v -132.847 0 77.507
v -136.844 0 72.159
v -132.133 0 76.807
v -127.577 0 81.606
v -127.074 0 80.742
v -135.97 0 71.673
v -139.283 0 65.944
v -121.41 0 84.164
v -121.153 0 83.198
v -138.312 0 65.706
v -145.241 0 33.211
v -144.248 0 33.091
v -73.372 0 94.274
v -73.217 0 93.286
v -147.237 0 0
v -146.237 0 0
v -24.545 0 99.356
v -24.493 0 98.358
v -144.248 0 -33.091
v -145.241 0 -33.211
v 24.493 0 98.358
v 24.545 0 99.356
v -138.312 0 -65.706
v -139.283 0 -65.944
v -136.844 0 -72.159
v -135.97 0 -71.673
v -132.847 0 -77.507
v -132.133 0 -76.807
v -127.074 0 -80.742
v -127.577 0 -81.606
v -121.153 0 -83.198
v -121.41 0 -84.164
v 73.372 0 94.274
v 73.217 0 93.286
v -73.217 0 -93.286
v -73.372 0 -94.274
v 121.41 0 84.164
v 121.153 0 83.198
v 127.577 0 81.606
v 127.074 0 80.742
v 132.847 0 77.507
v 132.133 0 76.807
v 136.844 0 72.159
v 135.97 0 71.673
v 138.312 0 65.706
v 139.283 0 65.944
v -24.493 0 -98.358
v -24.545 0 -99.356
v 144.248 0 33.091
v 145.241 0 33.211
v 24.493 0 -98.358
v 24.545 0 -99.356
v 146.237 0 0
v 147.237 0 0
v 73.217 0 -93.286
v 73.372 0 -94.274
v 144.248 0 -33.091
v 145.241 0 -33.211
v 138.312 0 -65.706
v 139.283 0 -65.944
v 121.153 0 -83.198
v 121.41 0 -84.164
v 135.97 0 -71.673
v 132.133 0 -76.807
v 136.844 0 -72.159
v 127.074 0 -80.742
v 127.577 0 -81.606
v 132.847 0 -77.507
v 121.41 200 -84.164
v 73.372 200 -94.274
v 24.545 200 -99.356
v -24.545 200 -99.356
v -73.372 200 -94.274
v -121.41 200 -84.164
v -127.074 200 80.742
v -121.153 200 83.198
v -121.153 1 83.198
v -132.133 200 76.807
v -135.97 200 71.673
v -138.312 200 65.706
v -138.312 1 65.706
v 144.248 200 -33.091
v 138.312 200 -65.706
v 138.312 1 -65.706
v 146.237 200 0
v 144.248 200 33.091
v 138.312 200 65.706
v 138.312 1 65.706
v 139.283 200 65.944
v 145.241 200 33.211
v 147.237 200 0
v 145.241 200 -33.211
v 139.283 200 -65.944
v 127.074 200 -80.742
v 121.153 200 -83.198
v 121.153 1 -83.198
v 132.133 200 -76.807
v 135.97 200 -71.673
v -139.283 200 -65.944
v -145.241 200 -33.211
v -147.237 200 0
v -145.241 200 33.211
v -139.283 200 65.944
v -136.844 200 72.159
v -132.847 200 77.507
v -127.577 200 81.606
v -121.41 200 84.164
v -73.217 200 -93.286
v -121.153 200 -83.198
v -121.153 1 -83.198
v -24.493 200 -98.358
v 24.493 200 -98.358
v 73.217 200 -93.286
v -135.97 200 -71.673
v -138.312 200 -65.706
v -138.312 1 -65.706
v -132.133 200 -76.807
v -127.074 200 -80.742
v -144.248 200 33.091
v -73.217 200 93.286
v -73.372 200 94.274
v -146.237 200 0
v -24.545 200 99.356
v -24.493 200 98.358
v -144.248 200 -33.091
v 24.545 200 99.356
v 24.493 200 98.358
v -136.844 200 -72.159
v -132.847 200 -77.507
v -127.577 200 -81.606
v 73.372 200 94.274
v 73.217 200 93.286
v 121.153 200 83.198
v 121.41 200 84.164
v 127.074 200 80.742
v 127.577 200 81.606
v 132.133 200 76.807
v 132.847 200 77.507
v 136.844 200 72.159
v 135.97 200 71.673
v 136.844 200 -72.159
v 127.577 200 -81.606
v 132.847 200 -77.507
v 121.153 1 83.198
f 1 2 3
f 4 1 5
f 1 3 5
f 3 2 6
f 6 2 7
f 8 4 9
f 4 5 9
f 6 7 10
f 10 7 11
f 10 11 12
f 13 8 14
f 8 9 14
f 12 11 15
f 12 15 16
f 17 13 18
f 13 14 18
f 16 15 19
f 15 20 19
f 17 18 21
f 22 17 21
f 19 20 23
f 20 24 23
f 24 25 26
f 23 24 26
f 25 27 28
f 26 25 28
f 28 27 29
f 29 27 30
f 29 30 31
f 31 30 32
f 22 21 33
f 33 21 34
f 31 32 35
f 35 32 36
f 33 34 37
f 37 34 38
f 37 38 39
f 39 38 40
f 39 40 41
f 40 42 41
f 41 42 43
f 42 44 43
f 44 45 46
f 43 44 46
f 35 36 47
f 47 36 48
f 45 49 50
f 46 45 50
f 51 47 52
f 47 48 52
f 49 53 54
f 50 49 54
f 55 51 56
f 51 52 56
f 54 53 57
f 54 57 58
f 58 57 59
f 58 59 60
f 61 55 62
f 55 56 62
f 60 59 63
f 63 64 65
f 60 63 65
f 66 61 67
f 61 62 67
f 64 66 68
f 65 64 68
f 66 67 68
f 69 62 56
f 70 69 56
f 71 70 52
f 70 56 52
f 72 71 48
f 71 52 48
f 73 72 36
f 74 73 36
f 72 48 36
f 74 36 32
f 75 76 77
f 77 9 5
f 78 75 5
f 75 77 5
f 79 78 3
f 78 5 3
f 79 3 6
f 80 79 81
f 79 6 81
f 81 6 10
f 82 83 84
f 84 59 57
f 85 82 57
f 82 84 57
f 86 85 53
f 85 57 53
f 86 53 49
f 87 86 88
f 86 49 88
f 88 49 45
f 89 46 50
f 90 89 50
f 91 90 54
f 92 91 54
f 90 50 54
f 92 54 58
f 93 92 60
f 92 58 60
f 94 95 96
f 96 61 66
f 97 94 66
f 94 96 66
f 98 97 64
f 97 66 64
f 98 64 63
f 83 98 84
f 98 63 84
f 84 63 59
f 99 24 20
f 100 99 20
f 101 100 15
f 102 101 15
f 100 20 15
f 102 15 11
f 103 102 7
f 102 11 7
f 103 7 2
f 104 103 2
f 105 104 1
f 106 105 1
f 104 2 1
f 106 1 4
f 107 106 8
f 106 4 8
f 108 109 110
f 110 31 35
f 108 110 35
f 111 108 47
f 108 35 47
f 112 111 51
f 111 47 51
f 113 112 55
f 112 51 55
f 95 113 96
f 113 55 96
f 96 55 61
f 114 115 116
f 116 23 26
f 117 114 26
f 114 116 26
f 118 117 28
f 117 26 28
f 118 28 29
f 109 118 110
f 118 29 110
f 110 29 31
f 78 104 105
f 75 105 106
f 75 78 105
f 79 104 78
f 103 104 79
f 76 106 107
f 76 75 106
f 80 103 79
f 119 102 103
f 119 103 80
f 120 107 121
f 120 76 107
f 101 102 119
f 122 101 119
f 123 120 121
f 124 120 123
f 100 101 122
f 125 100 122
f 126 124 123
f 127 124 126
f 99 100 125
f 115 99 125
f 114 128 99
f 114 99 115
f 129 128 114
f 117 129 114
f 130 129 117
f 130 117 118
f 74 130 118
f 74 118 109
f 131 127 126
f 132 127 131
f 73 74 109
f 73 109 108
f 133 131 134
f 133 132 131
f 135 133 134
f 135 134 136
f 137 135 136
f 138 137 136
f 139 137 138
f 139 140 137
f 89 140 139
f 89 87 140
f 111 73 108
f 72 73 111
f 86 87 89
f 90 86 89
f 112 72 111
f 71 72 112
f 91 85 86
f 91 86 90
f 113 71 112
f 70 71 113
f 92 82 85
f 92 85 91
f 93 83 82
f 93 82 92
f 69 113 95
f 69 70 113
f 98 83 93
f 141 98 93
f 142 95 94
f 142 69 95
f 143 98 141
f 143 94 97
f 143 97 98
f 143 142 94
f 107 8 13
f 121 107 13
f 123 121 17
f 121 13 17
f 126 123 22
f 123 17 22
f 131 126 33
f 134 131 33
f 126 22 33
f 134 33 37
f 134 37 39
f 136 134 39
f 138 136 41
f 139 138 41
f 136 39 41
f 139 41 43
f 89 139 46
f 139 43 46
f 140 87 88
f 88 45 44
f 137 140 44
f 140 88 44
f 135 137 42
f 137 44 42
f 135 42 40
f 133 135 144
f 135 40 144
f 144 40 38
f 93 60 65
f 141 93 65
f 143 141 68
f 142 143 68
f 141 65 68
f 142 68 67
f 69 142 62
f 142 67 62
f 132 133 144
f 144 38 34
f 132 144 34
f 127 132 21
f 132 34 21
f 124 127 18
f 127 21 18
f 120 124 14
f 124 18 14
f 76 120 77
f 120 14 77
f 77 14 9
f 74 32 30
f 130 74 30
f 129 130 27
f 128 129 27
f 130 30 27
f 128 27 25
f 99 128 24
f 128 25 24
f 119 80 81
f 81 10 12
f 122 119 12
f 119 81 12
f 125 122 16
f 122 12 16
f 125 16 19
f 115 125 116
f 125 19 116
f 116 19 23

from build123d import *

# Parameters (mm, degrees)
BOSS_EXTRUDE1_DEPTH = 200
SHELL3_T            = -1
CUT_EXTRUDE1_DEPTH  = 200


with BuildPart() as part:
    # Sketch1 → Boss-Extrude1 (new body)
    with BuildSketch(Plane(origin=(0, 0, 0), x_dir=(1, 0, 0), z_dir=(0, 1, 0))):
        with BuildLine():
            ThreePointArc((-121.409753109, 84.164334567), (-132.846711046, 77.506995883), (-139.283044385, 65.944220336))
            ThreePointArc((-139.283044385, 65.944220336), (-147.236834181, 0), (-139.283044385, -65.944220336))
            ThreePointArc((-139.283044385, -65.944220336), (-132.846711046, -77.506995883), (-121.409753109, -84.164334567))
            ThreePointArc((-121.409753109, -84.164334567), (0, -99.99301504), (121.409753109, -84.164334567))
            ThreePointArc((121.409753109, -84.164334567), (132.846711046, -77.506995883), (139.283044385, -65.944220336))
            ThreePointArc((139.283044385, -65.944220336), (147.236834181, 0), (139.283044385, 65.944220336))
            ThreePointArc((139.283044385, 65.944220336), (132.846711046, 77.506995883), (121.409753109, 84.164334567))
            ThreePointArc((121.409753109, 84.164334567), (0, 99.99301504), (-121.409753109, 84.164334567))
        make_face()
    extrude(amount=BOSS_EXTRUDE1_DEPTH)

    # Shell3
    shell3_openings = [part.faces().sort_by_distance(p)[0] for p in [
        (0, 200, 0),
    ]]
    offset(amount=SHELL3_T, openings=shell3_openings, kind=Kind.INTERSECTION)

    # Sketch3 → Cut-Extrude1 (cut)
    with BuildSketch(Plane.XZ):
        with BuildLine():
            ThreePointArc((-121.153362985, -83.197761185), (0, -98.99301504), (121.153362985, -83.197761185))
            ThreePointArc((121.153362985, -83.197761185), (132.132842604, -76.806716048), (138.311722609, -65.706451522))
            ThreePointArc((138.311722609, -65.706451522), (146.236834181, 0), (138.311722609, 65.706451522))
            ThreePointArc((138.311722609, 65.706451522), (132.132842604, 76.806716048), (121.153362985, 83.197761185))
            ThreePointArc((121.153362985, 83.197761185), (0, 98.99301504), (-121.153362985, 83.197761185))
            ThreePointArc((-121.153362985, 83.197761185), (-132.132842604, 76.806716048), (-138.311722609, 65.706451522))
            ThreePointArc((-138.311722609, 65.706451522), (-146.236834181, 0), (-138.311722609, -65.706451522))
            ThreePointArc((-138.311722609, -65.706451522), (-132.132842604, -76.806716048), (-121.153362985, -83.197761185))
        make_face()
    extrude(amount=-CUT_EXTRUDE1_DEPTH, mode=Mode.SUBTRACT)


solid = part.part
